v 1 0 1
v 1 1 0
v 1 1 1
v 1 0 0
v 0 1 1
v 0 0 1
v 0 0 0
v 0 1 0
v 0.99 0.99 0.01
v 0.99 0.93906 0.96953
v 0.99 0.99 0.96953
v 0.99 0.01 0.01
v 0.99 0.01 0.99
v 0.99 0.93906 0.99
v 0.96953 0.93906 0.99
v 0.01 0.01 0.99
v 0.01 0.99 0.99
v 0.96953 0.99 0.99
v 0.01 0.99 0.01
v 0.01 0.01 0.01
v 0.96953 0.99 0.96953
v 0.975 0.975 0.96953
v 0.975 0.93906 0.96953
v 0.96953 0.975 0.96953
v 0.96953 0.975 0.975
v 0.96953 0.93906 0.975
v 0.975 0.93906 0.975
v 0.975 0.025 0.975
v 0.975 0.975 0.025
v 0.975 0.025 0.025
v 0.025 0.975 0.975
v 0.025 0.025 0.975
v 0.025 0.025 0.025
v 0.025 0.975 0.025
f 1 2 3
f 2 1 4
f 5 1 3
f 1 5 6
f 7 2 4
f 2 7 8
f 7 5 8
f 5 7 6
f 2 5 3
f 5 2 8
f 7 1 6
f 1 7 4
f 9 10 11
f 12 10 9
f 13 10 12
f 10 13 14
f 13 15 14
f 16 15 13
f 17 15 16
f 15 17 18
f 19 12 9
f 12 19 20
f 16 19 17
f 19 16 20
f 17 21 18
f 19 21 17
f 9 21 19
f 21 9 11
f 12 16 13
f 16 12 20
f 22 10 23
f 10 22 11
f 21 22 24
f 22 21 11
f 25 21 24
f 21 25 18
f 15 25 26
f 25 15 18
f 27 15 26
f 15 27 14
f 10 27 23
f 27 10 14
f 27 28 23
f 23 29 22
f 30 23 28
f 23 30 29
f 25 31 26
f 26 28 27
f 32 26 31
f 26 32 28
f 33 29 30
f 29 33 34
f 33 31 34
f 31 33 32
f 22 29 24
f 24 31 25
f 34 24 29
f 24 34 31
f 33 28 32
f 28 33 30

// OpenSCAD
translate([0.984375, 0.96875, 0.984375]) color([0.703335456430867, 0.2907757333599926, 0.25740691473513444]) cube([0.0296875, 0.059375, 0.0296875], center=true);
translate([0.234375, 0.53125, 0.515625]) color([0.6753471185659878, 0.3427134335828621, 0.6623482279140148]) cube([0.0296875, 0.059375, 0.0296875], center=true);
translate([0.234375, 0.65625, 0.515625]) color([0.622709478555229, 0.9623458799428731, 0.6382059587743735]) cube([0.0296875, 0.059375, 0.0296875], center=true);
translate([0.234375, 0.53125, 0.640625]) color([0.6637443236925401, 0.3356751573470844, 0.8185491658643138]) cube([0.0296875, 0.059375, 0.0296875], center=true);
translate([0.234375, 0.65625, 0.640625]) color([0.9204599058105887, 0.6977248853574449, 0.8539392336975931]) cube([0.0296875, 0.059375, 0.0296875], center=true);
translate([0.234375, 0.78125, 0.515625]) color([0.6890790645393035, 0.16514982176485982, 0.929058540498273]) cube([0.0296875, 0.059375, 0.0296875], center=true);
translate([0.234375, 0.90625, 0.515625]) color([0.4504383154964039, 0.19969282367316898, 0.28753177965041454]) cube([0.0296875, 0.059375, 0.0296875], center=true);
translate([0.234375, 0.78125, 0.640625]) color([0.09132871013589805, 0.026933869289929357, 0.20530840773565484]) cube([0.0296875, 0.059375, 0.0296875], center=true);
translate([0.234375, 0.90625, 0.640625]) color([0.8927315272962589, 0.9837948347075738, 0.5921276239101826]) cube([0.0296875, 0.059375, 0.0296875], center=true);
translate([0.5, 0.5, 0.5]) color([0.9033731569314208, 0.6003113727851482, 0.44528251731819]) cube([0.95, 0.95, 0.95], center=true);
translate([0.984375, 0.96875, 0.984375]) color([0.7458263708893277, 0.8647207053703811, 0.0898016704206045]) cube([0.0296875, 0.059375, 0.0296875], center=true);
translate([0.515625, 0.53125, 0.515625]) color([0.038060926195686906, 0.8744727453457535, 0.12513594431856478]) cube([0.0296875, 0.059375, 0.0296875], center=true);
translate([0.515625, 0.65625, 0.515625]) color([0.42207210237525294, 0.34468170936487774, 0.9768651363918932]) cube([0.0296875, 0.059375, 0.0296875], center=true);
translate([0.515625, 0.53125, 0.640625]) color([0.028917120386816153, 0.08400349053529199, 0.37984204308055114]) cube([0.0296875, 0.059375, 0.0296875], center=true);
translate([0.515625, 0.65625, 0.640625]) color([0.3806441088977438, 0.7092523038197841, 0.998642533665466]) cube([0.0296875, 0.059375, 0.0296875], center=true);
translate([0.515625, 0.78125, 0.515625]) color([0.5376776199634331, 0.711049432293487, 0.5089509293552513]) cube([0.0296875, 0.059375, 0.0296875], center=true);
translate([0.515625, 0.90625, 0.515625]) color([0.6118191730521428, 0.118140939817442, 0.44089280241648354]) cube([0.0296875, 0.059375, 0.0296875], center=true);
translate([0.515625, 0.78125, 0.640625]) color([0.8763641691398498, 0.3073301530783371, 0.4809731695257723]) cube([0.0296875, 0.059375, 0.0296875], center=true);
translate([0.515625, 0.90625, 0.640625]) color([0.6718632913095229, 0.47112095992780145, 0.7891116427736021]) cube([0.0296875, 0.059375, 0.0296875], center=true);
translate([0.5, 0.5, 0.5]) color([0.846449463560921, 0.6498249122436305, 0.6691165823246009]) cube([0.95, 0.95, 0.95], center=true);
translate([0.984375, 0.96875, 0.984375]) color([0.6201459560554894, 0.3741332470728077, 0.3532295025959169]) cube([0.0296875, 0.059375, 0.0296875], center=true);
translate([0.265625, 0.46875, 0.515625]) color([0.21817188261422882, 0.9937641025607789, 0.5701779196071297]) cube([0.0296875, 0.059375, 0.0296875], center=true);
translate([0.265625, 0.46875, 0.578125]) color([0.4998267094975317, 0.5355022461369214, 0.43052725088947774]) cube([0.0296875, 0.059375, 0.0296875], center=true);
translate([0.390625, 0.46875, 0.515625]) color([0.3927444301395261, 0.2573888700166501, 0.5224208653215079]) cube([0.0296875, 0.059375, 0.0296875], center=true);
translate([0.390625, 0.46875, 0.578125]) color([0.3388525419710616, 0.14414538940491206, 0.03655375301796915]) cube([0.0296875, 0.059375, 0.0296875], center=true);
translate([0.265625, 0.46875, 0.640625]) color([0.845883050081675, 0.3589024664956413, 0.0768875668919895]) cube([0.0296875, 0.059375, 0.0296875], center=true);
translate([0.265625, 0.46875, 0.703125]) color([0.3387468833798418, 0.6987321147845988, 0.3068815904877129]) cube([0.0296875, 0.059375, 0.0296875], center=true);
translate([0.390625, 0.46875, 0.640625]) color([0.4625441932214739, 0.3864179351671122, 0.5490897525165606]) cube([0.0296875, 0.059375, 0.0296875], center=true);
translate([0.390625, 0.46875, 0.703125]) color([0.3659324091926345, 0.7545280339177156, 0.6050339912222921]) cube([0.0296875, 0.059375, 0.0296875], center=true);
translate([0.5, 0.5, 0.5]) color([0.5480605622189958, 0.054088661388036474, 0.9428919429605404]) cube([0.95, 0.95, 0.95], center=true);
translate([0.984375, 0.96875, 0.984375]) color([0.12845357201888552, 0.011732238247069593, 0.3764060194851956]) cube([0.0296875, 0.059375, 0.0296875], center=true);
translate([0.265625, 0.53125, 0.484375]) color([0.600223097380793, 0.12369369878480907, 0.26048855158305784]) cube([0.0296875, 0.059375, 0.0296875], center=true);
translate([0.265625, 0.65625, 0.484375]) color([0.5010606762114408, 0.931191517246671, 0.03620328932430994]) cube([0.0296875, 0.059375, 0.0296875], center=true);
translate([0.390625, 0.53125, 0.484375]) color([0.5033001870859429, 0.6907200225066832, 0.7443932872899042]) cube([0.0296875, 0.059375, 0.0296875], center=true);
translate([0.390625, 0.65625, 0.484375]) color([0.8828340761860495, 0.26092138926502484, 0.6139515106687901]) cube([0.0296875, 0.059375, 0.0296875], center=true);
translate([0.265625, 0.78125, 0.484375]) color([0.6743258614783304, 0.522656796994338, 0.9788179786081288]) cube([0.0296875, 0.059375, 0.0296875], center=true);
translate([0.265625, 0.90625, 0.484375]) color([0.4713008310172879, 0.8920736199264464, 0.9815553969185155]) cube([0.0296875, 0.059375, 0.0296875], center=true);
translate([0.390625, 0.78125, 0.484375]) color([0.06860707594764937, 0.8655665547265424, 0.9018308746779017]) cube([0.0296875, 0.059375, 0.0296875], center=true);
translate([0.390625, 0.90625, 0.484375]) color([0.1282172048796545, 0.05046793986180231, 0.4600177435956403]) cube([0.0296875, 0.059375, 0.0296875], center=true);
translate([0.5, 0.5, 0.5]) color([0.3857740362906176, 0.8900822808355634, 0.5389812903705407]) cube([0.95, 0.95, 0.95], center=true);
translate([0.984375, 0.96875, 0.984375]) color([0.8395877963754709, 0.9383672476321016, 0.8442326100492039]) cube([0.0296875, 0.059375, 0.0296875], center=true);
translate([0.265625, 0.53125, 0.765625]) color([0.36212261634386267, 0.6303688866388847, 0.8265420833562809]) cube([0.0296875, 0.059375, 0.0296875], center=true);
translate([0.265625, 0.65625, 0.765625]) color([0.9370648249938913, 0.3173919725358444, 0.612535640100225]) cube([0.0296875, 0.059375, 0.0296875], center=true);
translate([0.390625, 0.53125, 0.765625]) color([0.03403511398003223, 0.5363809260643565, 0.0438663390493661]) cube([0.0296875, 0.059375, 0.0296875], center=true);
translate([0.390625, 0.65625, 0.765625]) color([0.9932083041022491, 0.6558995579396248, 0.37533301828115495]) cube([0.0296875, 0.059375, 0.0296875], center=true);
translate([0.265625, 0.78125, 0.765625]) color([0.6250895203766232, 0.8998294967159934, 0.09782835255638733]) cube([0.0296875, 0.059375, 0.0296875], center=true);
translate([0.265625, 0.90625, 0.765625]) color([0.6201896456372876, 0.6774104942714119, 0.010614549135734563]) cube([0.0296875, 0.059375, 0.0296875], center=true);
translate([0.390625, 0.78125, 0.765625]) color([0.9721439114343117, 0.07339286490687968, 0.68532533593201]) cube([0.0296875, 0.059375, 0.0296875], center=true);
translate([0.390625, 0.90625, 0.765625]) color([0.6997479175423154, 0.17265044150292108, 0.6500884894082495]) cube([0.0296875, 0.059375, 0.0296875], center=true);
color([0.3,0.3,0.3,0.3]) difference() { cube([1,1,1]); translate([0.01,0.01,0.01]) cube([0.98,0.98,0.98]); }
